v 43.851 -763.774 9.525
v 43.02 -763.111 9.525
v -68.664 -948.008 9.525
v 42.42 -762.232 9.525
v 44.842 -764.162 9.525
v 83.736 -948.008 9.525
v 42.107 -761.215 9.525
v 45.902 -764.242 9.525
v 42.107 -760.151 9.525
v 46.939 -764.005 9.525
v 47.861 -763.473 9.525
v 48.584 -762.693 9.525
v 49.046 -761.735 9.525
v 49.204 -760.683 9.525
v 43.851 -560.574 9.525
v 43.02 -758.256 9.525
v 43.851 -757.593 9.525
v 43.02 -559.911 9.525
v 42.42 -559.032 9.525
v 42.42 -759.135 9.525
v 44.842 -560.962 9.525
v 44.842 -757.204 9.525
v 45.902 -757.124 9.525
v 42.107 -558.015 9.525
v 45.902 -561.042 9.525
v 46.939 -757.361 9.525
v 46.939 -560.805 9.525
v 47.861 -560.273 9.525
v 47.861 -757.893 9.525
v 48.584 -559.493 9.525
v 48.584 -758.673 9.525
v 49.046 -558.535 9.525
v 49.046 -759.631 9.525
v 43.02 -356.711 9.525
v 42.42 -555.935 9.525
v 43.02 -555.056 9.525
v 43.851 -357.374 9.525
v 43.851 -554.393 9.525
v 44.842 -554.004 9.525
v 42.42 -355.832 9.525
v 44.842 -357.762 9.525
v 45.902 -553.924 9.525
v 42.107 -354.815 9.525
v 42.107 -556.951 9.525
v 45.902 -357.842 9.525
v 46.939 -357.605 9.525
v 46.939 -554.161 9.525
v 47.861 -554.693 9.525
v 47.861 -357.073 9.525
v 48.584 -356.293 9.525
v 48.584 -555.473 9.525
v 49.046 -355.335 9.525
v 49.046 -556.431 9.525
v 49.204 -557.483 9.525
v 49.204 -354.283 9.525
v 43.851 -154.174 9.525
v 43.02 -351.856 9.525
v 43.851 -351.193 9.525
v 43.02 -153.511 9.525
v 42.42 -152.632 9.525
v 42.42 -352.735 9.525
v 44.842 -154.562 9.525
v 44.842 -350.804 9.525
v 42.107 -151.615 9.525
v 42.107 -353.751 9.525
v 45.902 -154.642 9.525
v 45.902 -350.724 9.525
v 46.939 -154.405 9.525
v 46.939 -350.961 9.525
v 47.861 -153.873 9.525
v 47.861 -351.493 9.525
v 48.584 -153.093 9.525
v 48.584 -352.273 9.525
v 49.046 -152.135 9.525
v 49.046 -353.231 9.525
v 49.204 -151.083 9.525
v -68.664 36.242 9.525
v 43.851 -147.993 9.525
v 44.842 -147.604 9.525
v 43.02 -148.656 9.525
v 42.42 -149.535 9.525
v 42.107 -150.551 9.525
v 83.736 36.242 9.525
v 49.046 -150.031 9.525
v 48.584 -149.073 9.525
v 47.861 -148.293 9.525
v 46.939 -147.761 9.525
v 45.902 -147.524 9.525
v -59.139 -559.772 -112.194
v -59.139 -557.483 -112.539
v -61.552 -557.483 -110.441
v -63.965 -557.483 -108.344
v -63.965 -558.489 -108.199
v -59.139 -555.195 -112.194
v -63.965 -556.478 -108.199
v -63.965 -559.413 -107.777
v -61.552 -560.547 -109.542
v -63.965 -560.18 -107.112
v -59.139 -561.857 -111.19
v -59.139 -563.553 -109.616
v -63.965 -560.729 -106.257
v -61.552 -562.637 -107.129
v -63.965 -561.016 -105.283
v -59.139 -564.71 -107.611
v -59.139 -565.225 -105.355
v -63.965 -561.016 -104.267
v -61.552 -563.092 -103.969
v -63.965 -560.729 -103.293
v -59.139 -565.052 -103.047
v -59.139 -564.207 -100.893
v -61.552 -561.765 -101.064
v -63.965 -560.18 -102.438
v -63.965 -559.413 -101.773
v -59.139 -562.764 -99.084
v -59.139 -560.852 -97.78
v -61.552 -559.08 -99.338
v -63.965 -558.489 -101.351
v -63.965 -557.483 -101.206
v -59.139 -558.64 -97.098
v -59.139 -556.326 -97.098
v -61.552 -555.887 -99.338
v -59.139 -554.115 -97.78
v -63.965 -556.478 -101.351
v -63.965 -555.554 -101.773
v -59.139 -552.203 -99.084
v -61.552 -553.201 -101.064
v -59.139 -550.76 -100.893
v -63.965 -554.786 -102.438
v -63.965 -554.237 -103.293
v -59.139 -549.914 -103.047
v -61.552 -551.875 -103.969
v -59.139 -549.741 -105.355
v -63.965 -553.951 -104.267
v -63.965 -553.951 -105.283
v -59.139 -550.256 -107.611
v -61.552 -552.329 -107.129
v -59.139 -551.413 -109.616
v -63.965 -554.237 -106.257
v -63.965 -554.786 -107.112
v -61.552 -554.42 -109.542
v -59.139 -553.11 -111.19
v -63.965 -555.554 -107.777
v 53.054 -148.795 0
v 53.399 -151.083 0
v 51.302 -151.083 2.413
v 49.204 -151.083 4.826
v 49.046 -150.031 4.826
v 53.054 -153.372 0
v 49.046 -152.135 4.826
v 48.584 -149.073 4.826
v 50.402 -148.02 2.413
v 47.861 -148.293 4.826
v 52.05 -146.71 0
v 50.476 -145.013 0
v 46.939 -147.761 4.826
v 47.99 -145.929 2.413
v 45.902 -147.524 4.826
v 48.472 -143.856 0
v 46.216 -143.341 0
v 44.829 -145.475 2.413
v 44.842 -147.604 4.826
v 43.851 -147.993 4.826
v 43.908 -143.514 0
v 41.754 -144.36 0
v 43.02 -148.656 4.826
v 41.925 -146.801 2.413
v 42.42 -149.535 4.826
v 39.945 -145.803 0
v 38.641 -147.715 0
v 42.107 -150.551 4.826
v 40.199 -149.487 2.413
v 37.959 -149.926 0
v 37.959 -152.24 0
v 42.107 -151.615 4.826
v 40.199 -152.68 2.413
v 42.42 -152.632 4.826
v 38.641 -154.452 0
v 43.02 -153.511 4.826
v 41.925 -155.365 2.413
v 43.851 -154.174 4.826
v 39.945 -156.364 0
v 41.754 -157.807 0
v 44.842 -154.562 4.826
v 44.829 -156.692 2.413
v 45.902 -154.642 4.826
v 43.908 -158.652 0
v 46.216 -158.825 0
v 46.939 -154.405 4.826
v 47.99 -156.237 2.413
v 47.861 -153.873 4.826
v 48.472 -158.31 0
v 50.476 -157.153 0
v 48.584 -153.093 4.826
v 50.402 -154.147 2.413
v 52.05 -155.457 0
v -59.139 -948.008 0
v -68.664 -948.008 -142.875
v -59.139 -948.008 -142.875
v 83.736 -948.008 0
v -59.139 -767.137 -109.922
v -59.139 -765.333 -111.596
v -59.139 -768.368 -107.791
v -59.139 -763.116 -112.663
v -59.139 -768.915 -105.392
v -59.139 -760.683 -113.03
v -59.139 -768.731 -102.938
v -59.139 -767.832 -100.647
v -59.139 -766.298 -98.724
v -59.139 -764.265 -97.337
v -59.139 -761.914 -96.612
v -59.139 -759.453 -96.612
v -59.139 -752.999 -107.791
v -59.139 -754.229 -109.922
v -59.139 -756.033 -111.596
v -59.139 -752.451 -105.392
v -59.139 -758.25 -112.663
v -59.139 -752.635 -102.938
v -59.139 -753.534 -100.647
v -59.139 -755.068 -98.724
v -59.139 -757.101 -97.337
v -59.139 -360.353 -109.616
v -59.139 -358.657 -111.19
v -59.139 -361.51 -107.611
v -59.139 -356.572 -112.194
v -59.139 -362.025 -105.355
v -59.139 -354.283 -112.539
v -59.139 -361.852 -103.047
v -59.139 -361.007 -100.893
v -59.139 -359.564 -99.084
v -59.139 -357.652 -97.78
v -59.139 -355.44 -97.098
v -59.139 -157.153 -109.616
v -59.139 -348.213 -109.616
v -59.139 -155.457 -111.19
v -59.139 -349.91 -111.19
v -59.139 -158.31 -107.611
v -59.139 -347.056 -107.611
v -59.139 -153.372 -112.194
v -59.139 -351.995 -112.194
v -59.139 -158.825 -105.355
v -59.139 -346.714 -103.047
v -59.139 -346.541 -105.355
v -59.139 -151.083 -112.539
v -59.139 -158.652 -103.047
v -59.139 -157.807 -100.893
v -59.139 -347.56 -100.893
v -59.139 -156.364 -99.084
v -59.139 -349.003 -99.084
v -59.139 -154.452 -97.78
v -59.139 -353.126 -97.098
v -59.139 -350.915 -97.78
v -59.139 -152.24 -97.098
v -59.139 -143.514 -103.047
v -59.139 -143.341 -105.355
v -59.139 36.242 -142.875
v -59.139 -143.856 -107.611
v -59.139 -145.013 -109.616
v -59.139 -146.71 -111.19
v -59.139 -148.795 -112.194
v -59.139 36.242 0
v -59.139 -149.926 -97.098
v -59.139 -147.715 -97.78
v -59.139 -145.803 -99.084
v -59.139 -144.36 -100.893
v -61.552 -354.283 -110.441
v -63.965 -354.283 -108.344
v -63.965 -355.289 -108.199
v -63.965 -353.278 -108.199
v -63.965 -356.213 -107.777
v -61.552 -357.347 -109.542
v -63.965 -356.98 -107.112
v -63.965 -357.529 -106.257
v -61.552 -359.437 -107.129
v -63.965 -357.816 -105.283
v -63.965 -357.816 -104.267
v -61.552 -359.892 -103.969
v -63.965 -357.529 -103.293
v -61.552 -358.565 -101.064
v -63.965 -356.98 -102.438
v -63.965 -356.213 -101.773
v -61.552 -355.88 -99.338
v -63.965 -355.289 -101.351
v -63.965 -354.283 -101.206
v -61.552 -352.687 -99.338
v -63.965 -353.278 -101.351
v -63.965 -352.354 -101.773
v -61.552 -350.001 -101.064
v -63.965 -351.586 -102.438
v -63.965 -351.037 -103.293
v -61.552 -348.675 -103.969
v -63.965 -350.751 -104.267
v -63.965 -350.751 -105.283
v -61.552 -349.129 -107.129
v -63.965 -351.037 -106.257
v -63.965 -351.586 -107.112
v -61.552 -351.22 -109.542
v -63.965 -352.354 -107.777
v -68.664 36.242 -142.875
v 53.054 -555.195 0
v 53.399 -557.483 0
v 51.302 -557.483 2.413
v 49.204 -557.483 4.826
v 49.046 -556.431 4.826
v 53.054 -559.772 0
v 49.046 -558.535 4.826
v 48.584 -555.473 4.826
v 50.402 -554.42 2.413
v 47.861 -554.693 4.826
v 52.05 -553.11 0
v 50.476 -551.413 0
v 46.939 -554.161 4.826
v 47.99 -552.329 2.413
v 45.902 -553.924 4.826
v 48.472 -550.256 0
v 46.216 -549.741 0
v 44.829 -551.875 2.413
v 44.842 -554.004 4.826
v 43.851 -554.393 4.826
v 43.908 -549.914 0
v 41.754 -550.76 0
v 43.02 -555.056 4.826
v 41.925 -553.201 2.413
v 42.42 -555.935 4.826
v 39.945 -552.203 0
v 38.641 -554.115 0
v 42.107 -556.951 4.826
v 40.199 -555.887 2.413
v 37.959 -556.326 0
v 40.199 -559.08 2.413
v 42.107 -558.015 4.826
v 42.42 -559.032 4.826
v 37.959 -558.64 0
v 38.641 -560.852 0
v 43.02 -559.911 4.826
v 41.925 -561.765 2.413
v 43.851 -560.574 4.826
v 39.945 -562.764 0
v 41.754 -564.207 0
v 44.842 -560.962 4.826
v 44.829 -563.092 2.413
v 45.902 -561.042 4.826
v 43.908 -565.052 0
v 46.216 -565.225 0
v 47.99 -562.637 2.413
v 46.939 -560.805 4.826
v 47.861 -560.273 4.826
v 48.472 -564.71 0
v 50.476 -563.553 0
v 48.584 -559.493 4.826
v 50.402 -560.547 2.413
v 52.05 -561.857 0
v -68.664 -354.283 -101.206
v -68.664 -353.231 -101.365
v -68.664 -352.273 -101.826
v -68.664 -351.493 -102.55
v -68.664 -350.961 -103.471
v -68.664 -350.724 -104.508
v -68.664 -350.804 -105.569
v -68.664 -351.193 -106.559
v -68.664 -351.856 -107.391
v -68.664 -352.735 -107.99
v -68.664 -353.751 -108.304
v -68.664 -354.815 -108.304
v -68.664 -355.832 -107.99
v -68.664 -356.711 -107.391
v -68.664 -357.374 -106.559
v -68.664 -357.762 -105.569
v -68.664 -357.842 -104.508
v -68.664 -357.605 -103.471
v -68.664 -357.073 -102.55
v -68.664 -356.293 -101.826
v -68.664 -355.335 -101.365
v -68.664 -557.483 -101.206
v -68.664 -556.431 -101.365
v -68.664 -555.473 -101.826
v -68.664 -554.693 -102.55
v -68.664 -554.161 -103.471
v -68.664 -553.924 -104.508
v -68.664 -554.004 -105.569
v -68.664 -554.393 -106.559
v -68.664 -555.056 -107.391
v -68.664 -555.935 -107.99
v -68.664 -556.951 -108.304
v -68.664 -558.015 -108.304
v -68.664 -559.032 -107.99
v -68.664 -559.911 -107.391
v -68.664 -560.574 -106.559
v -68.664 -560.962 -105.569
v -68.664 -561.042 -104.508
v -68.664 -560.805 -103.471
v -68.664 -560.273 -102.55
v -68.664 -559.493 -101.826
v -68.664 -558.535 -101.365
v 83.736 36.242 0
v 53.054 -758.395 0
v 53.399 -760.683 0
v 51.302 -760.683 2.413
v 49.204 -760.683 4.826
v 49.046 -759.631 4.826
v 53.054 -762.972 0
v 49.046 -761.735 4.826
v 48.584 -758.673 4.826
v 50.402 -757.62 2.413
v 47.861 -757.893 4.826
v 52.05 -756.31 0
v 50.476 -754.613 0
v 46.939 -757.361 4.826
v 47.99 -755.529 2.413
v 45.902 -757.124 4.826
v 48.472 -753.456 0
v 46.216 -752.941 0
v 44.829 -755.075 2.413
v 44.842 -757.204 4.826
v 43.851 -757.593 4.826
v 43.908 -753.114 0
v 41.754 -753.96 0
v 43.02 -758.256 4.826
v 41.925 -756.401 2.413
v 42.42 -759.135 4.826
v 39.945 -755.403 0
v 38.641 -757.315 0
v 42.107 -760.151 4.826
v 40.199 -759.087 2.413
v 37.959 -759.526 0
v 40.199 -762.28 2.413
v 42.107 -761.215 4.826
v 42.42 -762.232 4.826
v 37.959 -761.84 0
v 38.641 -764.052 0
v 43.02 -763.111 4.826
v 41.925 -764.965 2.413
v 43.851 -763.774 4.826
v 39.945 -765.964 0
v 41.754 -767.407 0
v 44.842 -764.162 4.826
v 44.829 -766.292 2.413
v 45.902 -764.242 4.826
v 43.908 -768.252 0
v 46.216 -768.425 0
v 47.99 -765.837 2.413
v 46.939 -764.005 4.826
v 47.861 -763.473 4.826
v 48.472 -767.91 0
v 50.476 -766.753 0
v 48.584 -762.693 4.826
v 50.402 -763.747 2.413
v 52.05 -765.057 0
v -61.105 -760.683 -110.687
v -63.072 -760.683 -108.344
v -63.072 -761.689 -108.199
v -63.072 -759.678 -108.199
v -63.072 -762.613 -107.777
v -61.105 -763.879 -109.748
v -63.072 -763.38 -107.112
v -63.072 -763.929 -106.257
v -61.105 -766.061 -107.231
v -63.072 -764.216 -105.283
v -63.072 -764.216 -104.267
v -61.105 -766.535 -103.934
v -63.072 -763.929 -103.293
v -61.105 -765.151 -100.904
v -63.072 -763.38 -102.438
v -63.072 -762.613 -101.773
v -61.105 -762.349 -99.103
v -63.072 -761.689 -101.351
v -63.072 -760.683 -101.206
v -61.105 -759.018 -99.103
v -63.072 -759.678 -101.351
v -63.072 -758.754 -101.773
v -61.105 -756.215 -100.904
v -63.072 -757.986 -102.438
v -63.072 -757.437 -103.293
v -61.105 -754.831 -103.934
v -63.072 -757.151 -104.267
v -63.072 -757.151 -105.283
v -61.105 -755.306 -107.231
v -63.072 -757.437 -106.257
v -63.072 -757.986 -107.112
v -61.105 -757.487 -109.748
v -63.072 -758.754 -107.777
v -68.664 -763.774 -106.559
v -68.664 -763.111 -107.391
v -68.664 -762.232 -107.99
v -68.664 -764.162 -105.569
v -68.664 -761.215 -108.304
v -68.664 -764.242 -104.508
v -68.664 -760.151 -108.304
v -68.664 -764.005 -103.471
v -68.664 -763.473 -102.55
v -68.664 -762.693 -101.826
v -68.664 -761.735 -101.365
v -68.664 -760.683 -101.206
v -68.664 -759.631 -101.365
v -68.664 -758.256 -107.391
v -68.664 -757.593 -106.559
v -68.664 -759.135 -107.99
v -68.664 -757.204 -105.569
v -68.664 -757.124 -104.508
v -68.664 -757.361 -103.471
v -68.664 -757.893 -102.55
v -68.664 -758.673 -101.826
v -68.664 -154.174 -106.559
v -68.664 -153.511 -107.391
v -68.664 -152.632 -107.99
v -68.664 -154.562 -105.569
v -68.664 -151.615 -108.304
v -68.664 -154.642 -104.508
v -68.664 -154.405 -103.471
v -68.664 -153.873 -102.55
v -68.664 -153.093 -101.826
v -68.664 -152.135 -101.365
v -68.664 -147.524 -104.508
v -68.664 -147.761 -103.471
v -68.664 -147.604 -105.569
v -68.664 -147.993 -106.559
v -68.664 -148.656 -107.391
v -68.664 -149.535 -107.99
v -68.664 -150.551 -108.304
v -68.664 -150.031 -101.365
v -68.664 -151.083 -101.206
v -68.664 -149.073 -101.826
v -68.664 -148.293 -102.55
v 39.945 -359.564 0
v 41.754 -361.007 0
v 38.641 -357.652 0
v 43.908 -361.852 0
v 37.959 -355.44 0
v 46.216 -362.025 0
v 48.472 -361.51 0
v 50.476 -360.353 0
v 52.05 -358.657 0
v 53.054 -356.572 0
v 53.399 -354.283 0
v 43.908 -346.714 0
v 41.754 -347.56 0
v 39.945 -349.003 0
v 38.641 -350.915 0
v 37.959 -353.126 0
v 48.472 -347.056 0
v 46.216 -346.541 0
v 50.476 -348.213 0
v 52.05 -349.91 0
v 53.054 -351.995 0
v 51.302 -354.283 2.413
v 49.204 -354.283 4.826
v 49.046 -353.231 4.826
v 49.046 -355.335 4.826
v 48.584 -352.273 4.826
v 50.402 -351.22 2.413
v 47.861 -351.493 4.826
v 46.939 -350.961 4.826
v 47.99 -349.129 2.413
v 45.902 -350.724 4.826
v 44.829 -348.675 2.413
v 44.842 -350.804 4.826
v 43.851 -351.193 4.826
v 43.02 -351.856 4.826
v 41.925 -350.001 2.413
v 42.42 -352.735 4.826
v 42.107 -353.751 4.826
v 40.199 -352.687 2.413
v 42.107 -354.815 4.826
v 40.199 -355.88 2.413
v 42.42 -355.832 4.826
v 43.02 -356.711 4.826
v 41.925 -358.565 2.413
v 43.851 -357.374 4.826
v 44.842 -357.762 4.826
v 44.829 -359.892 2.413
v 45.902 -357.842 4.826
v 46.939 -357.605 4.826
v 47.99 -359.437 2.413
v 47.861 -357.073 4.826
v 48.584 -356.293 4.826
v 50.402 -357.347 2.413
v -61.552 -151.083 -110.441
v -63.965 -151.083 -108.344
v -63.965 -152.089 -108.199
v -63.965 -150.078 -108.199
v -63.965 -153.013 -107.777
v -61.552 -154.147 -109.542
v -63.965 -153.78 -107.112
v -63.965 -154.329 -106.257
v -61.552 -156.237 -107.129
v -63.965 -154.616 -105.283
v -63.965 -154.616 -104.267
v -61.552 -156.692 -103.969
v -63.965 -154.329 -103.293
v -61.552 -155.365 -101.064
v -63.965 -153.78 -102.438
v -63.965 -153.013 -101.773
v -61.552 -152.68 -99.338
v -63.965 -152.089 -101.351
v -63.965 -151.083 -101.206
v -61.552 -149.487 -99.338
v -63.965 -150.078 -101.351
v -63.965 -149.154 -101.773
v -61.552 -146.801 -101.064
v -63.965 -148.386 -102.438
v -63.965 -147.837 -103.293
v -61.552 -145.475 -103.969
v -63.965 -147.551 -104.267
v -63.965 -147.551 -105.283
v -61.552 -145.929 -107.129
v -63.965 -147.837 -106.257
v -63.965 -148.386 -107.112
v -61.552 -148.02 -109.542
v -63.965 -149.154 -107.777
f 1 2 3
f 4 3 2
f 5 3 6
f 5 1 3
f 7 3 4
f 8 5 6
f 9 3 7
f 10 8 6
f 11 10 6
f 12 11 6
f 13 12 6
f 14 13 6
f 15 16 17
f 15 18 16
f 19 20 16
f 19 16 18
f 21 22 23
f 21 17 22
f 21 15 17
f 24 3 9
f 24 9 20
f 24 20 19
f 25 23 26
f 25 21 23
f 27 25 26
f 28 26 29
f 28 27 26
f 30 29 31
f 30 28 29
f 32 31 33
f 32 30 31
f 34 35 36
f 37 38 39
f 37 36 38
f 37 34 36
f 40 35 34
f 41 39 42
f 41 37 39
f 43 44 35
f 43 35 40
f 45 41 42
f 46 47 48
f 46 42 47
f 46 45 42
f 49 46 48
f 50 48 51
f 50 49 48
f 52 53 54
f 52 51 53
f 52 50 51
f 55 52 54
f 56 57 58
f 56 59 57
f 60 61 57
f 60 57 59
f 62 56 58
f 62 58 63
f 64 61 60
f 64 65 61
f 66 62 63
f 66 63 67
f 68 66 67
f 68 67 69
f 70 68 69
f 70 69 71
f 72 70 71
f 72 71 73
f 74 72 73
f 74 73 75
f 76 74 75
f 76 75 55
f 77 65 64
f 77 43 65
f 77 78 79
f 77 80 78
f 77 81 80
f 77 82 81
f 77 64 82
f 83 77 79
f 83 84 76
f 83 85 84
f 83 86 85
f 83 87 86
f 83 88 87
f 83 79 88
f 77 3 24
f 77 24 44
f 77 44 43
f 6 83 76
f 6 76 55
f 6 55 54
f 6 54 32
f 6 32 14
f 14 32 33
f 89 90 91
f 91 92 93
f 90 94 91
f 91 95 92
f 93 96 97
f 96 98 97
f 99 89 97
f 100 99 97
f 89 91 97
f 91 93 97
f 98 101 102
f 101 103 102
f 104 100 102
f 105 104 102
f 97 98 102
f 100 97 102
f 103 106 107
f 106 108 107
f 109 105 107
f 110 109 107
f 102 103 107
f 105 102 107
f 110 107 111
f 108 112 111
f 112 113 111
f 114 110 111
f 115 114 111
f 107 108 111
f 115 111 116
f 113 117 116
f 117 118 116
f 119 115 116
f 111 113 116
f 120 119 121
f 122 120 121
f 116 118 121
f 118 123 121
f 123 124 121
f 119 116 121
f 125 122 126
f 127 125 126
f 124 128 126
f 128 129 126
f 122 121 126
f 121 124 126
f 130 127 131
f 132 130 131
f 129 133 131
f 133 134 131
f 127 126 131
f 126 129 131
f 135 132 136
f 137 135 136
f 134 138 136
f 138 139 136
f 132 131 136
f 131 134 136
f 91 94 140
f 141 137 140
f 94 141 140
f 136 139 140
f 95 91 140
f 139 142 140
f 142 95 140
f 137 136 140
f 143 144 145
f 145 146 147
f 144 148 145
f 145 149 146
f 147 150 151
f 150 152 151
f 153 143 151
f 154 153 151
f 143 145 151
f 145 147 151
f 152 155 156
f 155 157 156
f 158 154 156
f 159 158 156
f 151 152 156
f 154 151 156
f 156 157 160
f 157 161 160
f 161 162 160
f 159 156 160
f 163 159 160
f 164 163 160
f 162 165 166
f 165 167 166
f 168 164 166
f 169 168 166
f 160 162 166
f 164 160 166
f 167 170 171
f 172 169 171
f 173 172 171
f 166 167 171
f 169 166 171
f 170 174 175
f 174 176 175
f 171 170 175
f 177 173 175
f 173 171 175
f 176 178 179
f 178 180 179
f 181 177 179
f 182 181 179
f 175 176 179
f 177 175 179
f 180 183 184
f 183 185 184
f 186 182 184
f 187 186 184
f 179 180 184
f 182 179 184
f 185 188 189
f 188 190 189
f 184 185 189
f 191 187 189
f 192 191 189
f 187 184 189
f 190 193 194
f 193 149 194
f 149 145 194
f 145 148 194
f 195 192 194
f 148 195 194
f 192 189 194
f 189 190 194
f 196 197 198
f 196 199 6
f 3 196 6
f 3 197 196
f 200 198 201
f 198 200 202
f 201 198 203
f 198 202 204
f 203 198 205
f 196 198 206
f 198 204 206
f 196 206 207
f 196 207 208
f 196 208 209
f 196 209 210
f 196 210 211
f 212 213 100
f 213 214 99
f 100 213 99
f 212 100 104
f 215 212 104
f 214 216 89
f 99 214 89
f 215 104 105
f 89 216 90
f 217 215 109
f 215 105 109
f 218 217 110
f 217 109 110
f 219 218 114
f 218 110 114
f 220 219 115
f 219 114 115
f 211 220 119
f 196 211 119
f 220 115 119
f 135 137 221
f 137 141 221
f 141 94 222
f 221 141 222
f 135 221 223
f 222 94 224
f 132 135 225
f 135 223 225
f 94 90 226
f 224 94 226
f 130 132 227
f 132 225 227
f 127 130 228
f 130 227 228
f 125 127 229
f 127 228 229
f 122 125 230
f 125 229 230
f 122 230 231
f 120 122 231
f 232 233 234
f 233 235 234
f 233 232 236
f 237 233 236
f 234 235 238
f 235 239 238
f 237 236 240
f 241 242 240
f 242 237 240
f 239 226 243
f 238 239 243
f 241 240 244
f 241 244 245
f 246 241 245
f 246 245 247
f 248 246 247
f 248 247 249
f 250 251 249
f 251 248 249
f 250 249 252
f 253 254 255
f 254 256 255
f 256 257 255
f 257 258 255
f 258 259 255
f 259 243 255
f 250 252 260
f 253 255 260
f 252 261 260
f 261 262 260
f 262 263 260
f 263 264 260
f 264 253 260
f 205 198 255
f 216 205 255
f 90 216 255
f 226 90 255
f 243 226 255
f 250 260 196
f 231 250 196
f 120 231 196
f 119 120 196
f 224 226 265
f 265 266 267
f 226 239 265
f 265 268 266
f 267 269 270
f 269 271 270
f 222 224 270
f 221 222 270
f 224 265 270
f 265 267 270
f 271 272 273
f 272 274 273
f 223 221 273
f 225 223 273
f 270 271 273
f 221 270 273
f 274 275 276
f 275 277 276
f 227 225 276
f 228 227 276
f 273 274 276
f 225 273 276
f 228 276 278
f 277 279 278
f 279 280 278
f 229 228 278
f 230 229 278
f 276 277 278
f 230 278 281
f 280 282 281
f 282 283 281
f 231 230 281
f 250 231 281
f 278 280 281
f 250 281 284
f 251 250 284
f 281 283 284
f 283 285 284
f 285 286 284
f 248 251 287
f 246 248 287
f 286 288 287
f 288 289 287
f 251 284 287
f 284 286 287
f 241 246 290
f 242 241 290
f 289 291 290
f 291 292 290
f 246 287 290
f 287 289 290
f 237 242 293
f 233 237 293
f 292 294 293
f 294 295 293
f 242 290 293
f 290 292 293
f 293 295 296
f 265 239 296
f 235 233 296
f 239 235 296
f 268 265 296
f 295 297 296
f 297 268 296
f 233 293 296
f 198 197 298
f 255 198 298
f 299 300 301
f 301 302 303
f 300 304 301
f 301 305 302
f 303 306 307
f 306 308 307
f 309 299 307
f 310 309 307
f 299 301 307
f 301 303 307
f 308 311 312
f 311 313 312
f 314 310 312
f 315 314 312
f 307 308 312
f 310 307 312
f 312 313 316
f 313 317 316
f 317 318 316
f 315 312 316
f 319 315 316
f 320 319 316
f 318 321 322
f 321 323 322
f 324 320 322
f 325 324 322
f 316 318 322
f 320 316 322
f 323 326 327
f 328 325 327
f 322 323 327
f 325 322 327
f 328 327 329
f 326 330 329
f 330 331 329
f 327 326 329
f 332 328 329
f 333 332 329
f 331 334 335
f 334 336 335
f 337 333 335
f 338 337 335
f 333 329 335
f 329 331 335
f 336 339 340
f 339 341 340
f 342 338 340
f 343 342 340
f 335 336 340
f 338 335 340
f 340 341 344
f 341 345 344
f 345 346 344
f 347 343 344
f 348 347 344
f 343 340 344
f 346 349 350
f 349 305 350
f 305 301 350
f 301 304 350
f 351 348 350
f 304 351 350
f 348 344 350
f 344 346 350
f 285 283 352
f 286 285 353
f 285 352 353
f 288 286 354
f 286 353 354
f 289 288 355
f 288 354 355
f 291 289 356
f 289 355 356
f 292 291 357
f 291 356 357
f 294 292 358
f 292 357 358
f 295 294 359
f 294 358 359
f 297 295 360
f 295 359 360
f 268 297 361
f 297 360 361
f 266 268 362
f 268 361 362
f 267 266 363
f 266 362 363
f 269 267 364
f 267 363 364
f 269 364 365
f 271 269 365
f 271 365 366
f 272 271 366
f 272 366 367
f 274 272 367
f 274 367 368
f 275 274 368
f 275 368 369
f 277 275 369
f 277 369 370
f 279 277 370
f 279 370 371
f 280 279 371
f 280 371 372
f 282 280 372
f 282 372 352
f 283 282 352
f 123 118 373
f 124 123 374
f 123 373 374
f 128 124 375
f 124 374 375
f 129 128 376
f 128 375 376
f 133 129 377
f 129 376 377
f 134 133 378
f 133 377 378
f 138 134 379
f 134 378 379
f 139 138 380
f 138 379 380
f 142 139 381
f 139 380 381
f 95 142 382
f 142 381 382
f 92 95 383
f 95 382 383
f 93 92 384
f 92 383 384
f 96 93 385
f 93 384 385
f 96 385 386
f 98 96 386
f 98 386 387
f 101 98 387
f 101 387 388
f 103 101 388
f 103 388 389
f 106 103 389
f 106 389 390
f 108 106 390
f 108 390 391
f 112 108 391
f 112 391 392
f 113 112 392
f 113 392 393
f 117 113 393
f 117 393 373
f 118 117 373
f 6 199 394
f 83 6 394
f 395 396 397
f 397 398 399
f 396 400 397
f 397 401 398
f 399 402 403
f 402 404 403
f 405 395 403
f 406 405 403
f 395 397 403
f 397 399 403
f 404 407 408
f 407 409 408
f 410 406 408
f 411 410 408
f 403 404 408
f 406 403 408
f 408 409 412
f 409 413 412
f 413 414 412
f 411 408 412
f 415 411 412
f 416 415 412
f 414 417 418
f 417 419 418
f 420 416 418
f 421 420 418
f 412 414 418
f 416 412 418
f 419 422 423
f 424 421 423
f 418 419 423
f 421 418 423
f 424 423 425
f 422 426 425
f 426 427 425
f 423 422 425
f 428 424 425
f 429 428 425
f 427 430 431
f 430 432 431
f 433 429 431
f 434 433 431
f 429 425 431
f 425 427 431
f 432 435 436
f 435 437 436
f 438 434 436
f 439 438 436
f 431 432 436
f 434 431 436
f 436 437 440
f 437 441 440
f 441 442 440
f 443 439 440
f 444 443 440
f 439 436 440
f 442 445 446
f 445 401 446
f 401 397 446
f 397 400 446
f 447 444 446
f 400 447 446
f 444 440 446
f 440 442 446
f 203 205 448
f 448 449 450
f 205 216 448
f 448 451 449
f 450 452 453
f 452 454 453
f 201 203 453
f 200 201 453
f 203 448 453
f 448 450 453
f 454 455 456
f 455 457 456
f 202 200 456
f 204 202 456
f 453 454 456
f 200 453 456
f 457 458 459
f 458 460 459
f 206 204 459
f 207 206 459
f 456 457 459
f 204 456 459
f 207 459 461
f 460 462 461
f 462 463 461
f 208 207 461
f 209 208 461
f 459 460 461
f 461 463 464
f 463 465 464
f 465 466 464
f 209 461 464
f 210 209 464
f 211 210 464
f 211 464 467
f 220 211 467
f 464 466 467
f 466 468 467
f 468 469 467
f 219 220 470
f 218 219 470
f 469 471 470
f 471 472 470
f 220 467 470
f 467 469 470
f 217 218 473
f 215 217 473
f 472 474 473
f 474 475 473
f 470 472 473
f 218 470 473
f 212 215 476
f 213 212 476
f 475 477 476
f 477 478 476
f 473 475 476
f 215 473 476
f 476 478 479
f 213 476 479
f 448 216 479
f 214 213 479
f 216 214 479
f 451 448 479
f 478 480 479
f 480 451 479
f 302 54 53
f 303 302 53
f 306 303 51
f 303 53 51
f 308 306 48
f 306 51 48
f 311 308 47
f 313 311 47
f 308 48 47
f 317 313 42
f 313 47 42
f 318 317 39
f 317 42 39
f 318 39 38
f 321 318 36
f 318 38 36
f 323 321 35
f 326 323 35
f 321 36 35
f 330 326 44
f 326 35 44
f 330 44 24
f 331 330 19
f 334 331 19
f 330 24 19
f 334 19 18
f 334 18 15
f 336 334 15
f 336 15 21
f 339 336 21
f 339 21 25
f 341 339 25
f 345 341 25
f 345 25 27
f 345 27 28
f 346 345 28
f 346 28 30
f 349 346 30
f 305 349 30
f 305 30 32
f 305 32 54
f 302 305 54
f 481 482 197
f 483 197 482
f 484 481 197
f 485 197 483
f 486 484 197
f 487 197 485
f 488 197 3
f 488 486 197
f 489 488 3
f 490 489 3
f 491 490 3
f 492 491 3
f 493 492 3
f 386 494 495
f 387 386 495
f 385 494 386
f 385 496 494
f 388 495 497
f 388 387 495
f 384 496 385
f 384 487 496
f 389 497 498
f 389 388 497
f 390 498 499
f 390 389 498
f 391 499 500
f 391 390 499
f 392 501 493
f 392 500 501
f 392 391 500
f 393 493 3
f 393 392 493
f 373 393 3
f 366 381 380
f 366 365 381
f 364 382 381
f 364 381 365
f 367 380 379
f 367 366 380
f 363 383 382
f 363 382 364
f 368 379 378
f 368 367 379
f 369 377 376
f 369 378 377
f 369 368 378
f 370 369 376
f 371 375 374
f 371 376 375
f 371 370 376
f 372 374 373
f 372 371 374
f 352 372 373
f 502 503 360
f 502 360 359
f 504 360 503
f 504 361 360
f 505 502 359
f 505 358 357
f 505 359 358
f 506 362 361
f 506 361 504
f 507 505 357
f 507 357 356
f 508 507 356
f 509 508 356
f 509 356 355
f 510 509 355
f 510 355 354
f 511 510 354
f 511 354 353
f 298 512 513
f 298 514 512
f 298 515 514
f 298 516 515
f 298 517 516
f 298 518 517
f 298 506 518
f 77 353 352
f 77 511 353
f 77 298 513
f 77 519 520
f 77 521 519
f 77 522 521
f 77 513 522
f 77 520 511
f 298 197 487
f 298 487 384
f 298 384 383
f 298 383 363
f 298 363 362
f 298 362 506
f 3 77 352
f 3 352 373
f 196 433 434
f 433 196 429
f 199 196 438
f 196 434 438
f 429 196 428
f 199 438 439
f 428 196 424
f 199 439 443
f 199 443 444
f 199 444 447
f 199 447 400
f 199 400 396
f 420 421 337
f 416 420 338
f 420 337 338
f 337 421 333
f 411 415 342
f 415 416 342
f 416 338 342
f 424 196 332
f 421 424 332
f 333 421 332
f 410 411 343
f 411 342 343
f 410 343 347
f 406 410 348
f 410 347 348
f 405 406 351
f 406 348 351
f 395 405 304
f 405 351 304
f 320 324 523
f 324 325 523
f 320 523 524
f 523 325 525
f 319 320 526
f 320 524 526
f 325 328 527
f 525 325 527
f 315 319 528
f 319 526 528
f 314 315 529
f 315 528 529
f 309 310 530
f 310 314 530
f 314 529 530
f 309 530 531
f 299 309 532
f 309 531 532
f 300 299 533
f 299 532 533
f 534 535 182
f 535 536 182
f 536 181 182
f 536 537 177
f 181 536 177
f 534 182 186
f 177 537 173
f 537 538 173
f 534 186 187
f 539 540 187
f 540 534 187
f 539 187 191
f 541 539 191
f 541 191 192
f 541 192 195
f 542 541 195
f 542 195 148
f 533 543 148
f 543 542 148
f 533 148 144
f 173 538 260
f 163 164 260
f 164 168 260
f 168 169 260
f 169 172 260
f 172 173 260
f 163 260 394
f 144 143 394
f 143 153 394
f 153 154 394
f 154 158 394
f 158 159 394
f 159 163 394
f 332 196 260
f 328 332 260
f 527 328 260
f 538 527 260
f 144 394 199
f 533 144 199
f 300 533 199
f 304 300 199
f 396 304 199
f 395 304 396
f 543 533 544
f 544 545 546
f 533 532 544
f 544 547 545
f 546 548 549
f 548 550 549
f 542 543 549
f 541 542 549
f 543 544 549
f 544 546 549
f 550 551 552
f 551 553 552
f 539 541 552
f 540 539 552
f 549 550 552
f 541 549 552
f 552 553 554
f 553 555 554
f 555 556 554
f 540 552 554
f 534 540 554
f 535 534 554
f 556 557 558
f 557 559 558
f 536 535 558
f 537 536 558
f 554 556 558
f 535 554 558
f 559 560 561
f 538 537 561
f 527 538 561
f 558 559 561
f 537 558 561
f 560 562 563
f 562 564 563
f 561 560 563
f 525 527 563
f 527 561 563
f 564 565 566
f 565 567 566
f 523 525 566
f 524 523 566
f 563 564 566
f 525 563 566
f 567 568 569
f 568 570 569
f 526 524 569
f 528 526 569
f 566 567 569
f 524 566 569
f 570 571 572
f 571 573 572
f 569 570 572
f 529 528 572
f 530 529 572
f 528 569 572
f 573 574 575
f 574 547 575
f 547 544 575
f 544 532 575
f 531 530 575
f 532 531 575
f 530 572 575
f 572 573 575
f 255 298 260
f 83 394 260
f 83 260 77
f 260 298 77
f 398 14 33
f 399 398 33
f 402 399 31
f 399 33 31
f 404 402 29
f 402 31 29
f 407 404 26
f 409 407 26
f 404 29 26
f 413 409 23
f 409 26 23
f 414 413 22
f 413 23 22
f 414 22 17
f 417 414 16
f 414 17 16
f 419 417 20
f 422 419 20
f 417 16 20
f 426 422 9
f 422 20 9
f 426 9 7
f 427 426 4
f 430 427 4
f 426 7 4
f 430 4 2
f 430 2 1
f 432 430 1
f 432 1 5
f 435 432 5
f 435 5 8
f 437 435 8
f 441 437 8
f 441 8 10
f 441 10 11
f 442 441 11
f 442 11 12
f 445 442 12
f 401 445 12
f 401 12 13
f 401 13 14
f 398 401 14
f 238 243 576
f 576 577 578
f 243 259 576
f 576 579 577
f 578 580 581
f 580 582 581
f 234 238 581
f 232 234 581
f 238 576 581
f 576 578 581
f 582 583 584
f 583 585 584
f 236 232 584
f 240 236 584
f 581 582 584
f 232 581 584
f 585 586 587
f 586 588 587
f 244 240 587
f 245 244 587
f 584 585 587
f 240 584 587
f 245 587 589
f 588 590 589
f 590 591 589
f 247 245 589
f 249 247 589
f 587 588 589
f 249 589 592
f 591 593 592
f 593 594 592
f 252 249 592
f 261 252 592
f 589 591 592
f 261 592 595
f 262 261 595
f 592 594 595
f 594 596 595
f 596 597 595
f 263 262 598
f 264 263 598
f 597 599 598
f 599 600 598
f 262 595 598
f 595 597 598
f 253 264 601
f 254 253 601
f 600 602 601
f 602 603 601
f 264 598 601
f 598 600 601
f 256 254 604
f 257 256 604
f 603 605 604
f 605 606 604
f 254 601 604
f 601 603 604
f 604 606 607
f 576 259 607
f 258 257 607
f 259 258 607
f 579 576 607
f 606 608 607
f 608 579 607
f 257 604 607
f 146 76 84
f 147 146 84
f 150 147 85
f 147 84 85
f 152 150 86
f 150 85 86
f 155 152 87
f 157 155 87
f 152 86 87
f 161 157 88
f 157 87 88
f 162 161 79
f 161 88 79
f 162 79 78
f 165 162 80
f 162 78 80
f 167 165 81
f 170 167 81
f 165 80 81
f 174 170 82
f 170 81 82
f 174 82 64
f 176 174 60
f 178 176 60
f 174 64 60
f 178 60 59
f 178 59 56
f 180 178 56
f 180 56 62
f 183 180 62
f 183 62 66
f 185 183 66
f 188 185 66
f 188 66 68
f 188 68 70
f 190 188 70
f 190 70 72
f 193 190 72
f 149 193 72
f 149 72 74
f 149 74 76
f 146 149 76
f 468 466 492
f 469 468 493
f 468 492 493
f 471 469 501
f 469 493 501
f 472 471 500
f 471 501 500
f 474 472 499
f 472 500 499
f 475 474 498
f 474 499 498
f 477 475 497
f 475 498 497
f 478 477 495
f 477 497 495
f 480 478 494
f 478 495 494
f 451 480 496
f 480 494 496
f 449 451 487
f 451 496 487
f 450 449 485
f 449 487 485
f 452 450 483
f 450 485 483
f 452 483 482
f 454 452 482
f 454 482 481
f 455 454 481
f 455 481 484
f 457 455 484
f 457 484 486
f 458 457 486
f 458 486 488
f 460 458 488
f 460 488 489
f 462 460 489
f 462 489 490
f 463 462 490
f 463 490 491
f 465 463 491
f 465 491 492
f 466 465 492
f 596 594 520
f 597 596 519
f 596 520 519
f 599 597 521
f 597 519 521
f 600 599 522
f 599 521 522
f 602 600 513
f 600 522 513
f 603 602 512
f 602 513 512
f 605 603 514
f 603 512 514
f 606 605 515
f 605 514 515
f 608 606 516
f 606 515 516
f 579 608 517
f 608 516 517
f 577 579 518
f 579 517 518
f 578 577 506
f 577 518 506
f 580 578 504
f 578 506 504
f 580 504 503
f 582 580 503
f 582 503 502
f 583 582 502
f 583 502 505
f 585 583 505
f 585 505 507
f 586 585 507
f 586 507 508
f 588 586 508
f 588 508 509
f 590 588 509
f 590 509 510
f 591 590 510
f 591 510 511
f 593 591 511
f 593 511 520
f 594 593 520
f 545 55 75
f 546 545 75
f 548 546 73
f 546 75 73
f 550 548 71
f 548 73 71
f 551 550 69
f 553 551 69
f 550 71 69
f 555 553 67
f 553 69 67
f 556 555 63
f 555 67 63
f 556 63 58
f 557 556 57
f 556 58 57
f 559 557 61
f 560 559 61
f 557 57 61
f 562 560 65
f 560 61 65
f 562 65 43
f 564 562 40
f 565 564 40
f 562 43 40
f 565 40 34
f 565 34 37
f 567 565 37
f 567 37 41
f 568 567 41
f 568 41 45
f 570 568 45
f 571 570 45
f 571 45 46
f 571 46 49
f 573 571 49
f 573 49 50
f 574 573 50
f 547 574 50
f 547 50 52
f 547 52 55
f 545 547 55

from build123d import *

# Parameters (mm, degrees)
SKETCH2_W                                           = 152.4
SKETCH2_H                                           = 984.25
BOSS_EXTRUDE1_DEPTH                                 = 9.525
SKETCH4_W                                           = 142.875
SKETCH4_H                                           = 984.25
BOSS_EXTRUDE2_DEPTH                                 = 9.525
SKETCH5_R                                           = 3.5687
CUT_EXTRUDE1_DEPTH                                  = 9.525
SKETCH6_R                                           = 3.5687
CUT_EXTRUDE2_DEPTH                                  = 9.525
CSK_FOR_1_4_FLAT_HEAD_MACHINE_SCREW1_D              = 6.7564
CSK_FOR_1_4_FLAT_HEAD_MACHINE_SCREW1_CSINK_D        = 15.5273756
CSK_FOR_1_4_FLAT_HEAD_MACHINE_SCREW1_CSINK_ANGLE    = 82
CSK_FOR_1_4_FLAT_HEAD_MACHINE_SCREW2_D              = 6.7564
CSK_FOR_1_4_FLAT_HEAD_MACHINE_SCREW2_CSINK_D        = 15.5273756
CSK_FOR_1_4_FLAT_HEAD_MACHINE_SCREW2_CSINK_ANGLE    = 82
CSK_FOR_1_4_FLAT_HEAD_MACHINE_SCREW_100_D           = 6.7564
CSK_FOR_1_4_FLAT_HEAD_MACHINE_SCREW_100_CSINK_D     = 16.510254
CSK_FOR_1_4_FLAT_HEAD_MACHINE_SCREW_100_CSINK_ANGLE = 100
CSK_FOR_1_4_FLAT_HEAD_MACHINE_SCREW5_D              = 6.7564
CSK_FOR_1_4_FLAT_HEAD_MACHINE_SCREW5_CSINK_D        = 15.5273756
CSK_FOR_1_4_FLAT_HEAD_MACHINE_SCREW5_CSINK_ANGLE    = 82
CSK_FOR_1_4_FLAT_HEAD_MACHINE_SCREW6_D              = 6.7564
CSK_FOR_1_4_FLAT_HEAD_MACHINE_SCREW6_CSINK_D        = 15.5273756
CSK_FOR_1_4_FLAT_HEAD_MACHINE_SCREW6_CSINK_ANGLE    = 82
CSK_FOR_1_4_FLAT_HEAD_MACHINE_SCREW7_D              = 6.7564
CSK_FOR_1_4_FLAT_HEAD_MACHINE_SCREW7_CSINK_D        = 15.5273756
CSK_FOR_1_4_FLAT_HEAD_MACHINE_SCREW7_CSINK_ANGLE    = 82
CSK_FOR_1_4_FLAT_HEAD_MACHINE_SCREW8_D              = 6.7564
CSK_FOR_1_4_FLAT_HEAD_MACHINE_SCREW8_CSINK_D        = 15.5273756
CSK_FOR_1_4_FLAT_HEAD_MACHINE_SCREW8_CSINK_ANGLE    = 82
CSK_FOR_1_4_FLAT_HEAD_MACHINE_SCREW4_D              = 6.7564
CSK_FOR_1_4_FLAT_HEAD_MACHINE_SCREW4_CSINK_D        = 15.5273756
CSK_FOR_1_4_FLAT_HEAD_MACHINE_SCREW4_CSINK_ANGLE    = 82


with BuildPart() as part:
    # Sketch2 → Boss-Extrude1 (new body)
    with BuildSketch(Plane.XY):
        with Locations((7.535690004, -455.883176253)):
            Rectangle(SKETCH2_W, SKETCH2_H)
    extrude(amount=BOSS_EXTRUDE1_DEPTH)

    # Sketch4 → Boss-Extrude2 (add)
    with BuildSketch(Plane.ZY.offset(68.664309996)):
        with Locations((-71.4375, -455.883176253)):
            Rectangle(SKETCH4_W, SKETCH4_H)
    extrude(amount=-BOSS_EXTRUDE2_DEPTH)

    # Sketch5 → Cut-Extrude1 (cut)
    with BuildSketch(Plane.ZY.offset(68.664309996)):
        with Locations((-104.775, -151.083176253)):
            Circle(SKETCH5_R)
        with Locations((-104.775, -354.283176253)):
            Circle(SKETCH5_R)
        with Locations((-104.775, -557.483176253)):
            Circle(SKETCH5_R)
        with Locations((-104.775, -760.683176253)):
            Circle(SKETCH5_R)
    extrude(amount=-CUT_EXTRUDE1_DEPTH, mode=Mode.SUBTRACT)

    # Sketch6 → Cut-Extrude2 (cut)
    with BuildSketch(Plane.XY.offset(9.525)):
        with Locations((45.635690004, -151.083176253)):
            Circle(SKETCH6_R)
        with Locations((45.635690004, -354.283176253)):
            Circle(SKETCH6_R)
        with Locations((45.635690004, -557.483176253)):
            Circle(SKETCH6_R)
        with Locations((45.635690004, -760.683176253)):
            Circle(SKETCH6_R)
    extrude(amount=-CUT_EXTRUDE2_DEPTH, mode=Mode.SUBTRACT)

    # CSK for 1/4 Flat Head Machine Screw1 (through all)
    with Locations(Plane(origin=(-59.139309996, -151.083176253, -104.775), x_dir=(0, 0, 1), z_dir=(1, 0, 0))):
        with Locations((0, 0)):
            CounterSinkHole(CSK_FOR_1_4_FLAT_HEAD_MACHINE_SCREW1_D / 2, CSK_FOR_1_4_FLAT_HEAD_MACHINE_SCREW1_CSINK_D / 2, counter_sink_angle=CSK_FOR_1_4_FLAT_HEAD_MACHINE_SCREW1_CSINK_ANGLE)

    # CSK for 1/4 Flat Head Machine Screw2 (through all)
    with Locations(Plane(origin=(-59.139309996, -354.283176253, -104.775), x_dir=(0, 0, 1), z_dir=(1, 0, 0))):
        with Locations((0, 0)):
            CounterSinkHole(CSK_FOR_1_4_FLAT_HEAD_MACHINE_SCREW2_D / 2, CSK_FOR_1_4_FLAT_HEAD_MACHINE_SCREW2_CSINK_D / 2, counter_sink_angle=CSK_FOR_1_4_FLAT_HEAD_MACHINE_SCREW2_CSINK_ANGLE)

    # CSK for 1/4 Flat Head Machine Screw (100)4 (through all)
    with Locations(Plane(origin=(-59.139309996, -760.683176253, -104.775), x_dir=(0, 0, 1), z_dir=(1, 0, 0))):
        with Locations((0, 0)):
            CounterSinkHole(CSK_FOR_1_4_FLAT_HEAD_MACHINE_SCREW_100_D / 2, CSK_FOR_1_4_FLAT_HEAD_MACHINE_SCREW_100_CSINK_D / 2, counter_sink_angle=CSK_FOR_1_4_FLAT_HEAD_MACHINE_SCREW_100_CSINK_ANGLE)

    # CSK for 1/4 Flat Head Machine Screw5 (through all)
    with Locations(Plane(origin=(45.635690004, -151.083176253, 0), x_dir=(-1, 0, 0), z_dir=(0, 0, -1))):
        with Locations((0, 0)):
            CounterSinkHole(CSK_FOR_1_4_FLAT_HEAD_MACHINE_SCREW5_D / 2, CSK_FOR_1_4_FLAT_HEAD_MACHINE_SCREW5_CSINK_D / 2, counter_sink_angle=CSK_FOR_1_4_FLAT_HEAD_MACHINE_SCREW5_CSINK_ANGLE)

    # CSK for 1/4 Flat Head Machine Screw6 (through all)
    with Locations(Plane(origin=(45.635690004, -354.283176253, 0), x_dir=(-1, 0, 0), z_dir=(0, 0, -1))):
        with Locations((0, 0)):
            CounterSinkHole(CSK_FOR_1_4_FLAT_HEAD_MACHINE_SCREW6_D / 2, CSK_FOR_1_4_FLAT_HEAD_MACHINE_SCREW6_CSINK_D / 2, counter_sink_angle=CSK_FOR_1_4_FLAT_HEAD_MACHINE_SCREW6_CSINK_ANGLE)

    # CSK for 1/4 Flat Head Machine Screw7 (through all)
    with Locations(Plane(origin=(45.635690004, -557.483176253, 0), x_dir=(-1, 0, 0), z_dir=(0, 0, -1))):
        with Locations((0, 0)):
            CounterSinkHole(CSK_FOR_1_4_FLAT_HEAD_MACHINE_SCREW7_D / 2, CSK_FOR_1_4_FLAT_HEAD_MACHINE_SCREW7_CSINK_D / 2, counter_sink_angle=CSK_FOR_1_4_FLAT_HEAD_MACHINE_SCREW7_CSINK_ANGLE)

    # CSK for 1/4 Flat Head Machine Screw8 (through all)
    with Locations(Plane(origin=(45.635690004, -760.683176253, 0), x_dir=(-1, 0, 0), z_dir=(0, 0, -1))):
        with Locations((0, 0)):
            CounterSinkHole(CSK_FOR_1_4_FLAT_HEAD_MACHINE_SCREW8_D / 2, CSK_FOR_1_4_FLAT_HEAD_MACHINE_SCREW8_CSINK_D / 2, counter_sink_angle=CSK_FOR_1_4_FLAT_HEAD_MACHINE_SCREW8_CSINK_ANGLE)

    # CSK for 1/4 Flat Head Machine Screw4 (through all)
    with Locations(Plane(origin=(-59.139309996, -557.483176253, -104.775), x_dir=(0, 0, 1), z_dir=(1, 0, 0))):
        with Locations((0, 0)):
            CounterSinkHole(CSK_FOR_1_4_FLAT_HEAD_MACHINE_SCREW4_D / 2, CSK_FOR_1_4_FLAT_HEAD_MACHINE_SCREW4_CSINK_D / 2, counter_sink_angle=CSK_FOR_1_4_FLAT_HEAD_MACHINE_SCREW4_CSINK_ANGLE)


solid = part.part
